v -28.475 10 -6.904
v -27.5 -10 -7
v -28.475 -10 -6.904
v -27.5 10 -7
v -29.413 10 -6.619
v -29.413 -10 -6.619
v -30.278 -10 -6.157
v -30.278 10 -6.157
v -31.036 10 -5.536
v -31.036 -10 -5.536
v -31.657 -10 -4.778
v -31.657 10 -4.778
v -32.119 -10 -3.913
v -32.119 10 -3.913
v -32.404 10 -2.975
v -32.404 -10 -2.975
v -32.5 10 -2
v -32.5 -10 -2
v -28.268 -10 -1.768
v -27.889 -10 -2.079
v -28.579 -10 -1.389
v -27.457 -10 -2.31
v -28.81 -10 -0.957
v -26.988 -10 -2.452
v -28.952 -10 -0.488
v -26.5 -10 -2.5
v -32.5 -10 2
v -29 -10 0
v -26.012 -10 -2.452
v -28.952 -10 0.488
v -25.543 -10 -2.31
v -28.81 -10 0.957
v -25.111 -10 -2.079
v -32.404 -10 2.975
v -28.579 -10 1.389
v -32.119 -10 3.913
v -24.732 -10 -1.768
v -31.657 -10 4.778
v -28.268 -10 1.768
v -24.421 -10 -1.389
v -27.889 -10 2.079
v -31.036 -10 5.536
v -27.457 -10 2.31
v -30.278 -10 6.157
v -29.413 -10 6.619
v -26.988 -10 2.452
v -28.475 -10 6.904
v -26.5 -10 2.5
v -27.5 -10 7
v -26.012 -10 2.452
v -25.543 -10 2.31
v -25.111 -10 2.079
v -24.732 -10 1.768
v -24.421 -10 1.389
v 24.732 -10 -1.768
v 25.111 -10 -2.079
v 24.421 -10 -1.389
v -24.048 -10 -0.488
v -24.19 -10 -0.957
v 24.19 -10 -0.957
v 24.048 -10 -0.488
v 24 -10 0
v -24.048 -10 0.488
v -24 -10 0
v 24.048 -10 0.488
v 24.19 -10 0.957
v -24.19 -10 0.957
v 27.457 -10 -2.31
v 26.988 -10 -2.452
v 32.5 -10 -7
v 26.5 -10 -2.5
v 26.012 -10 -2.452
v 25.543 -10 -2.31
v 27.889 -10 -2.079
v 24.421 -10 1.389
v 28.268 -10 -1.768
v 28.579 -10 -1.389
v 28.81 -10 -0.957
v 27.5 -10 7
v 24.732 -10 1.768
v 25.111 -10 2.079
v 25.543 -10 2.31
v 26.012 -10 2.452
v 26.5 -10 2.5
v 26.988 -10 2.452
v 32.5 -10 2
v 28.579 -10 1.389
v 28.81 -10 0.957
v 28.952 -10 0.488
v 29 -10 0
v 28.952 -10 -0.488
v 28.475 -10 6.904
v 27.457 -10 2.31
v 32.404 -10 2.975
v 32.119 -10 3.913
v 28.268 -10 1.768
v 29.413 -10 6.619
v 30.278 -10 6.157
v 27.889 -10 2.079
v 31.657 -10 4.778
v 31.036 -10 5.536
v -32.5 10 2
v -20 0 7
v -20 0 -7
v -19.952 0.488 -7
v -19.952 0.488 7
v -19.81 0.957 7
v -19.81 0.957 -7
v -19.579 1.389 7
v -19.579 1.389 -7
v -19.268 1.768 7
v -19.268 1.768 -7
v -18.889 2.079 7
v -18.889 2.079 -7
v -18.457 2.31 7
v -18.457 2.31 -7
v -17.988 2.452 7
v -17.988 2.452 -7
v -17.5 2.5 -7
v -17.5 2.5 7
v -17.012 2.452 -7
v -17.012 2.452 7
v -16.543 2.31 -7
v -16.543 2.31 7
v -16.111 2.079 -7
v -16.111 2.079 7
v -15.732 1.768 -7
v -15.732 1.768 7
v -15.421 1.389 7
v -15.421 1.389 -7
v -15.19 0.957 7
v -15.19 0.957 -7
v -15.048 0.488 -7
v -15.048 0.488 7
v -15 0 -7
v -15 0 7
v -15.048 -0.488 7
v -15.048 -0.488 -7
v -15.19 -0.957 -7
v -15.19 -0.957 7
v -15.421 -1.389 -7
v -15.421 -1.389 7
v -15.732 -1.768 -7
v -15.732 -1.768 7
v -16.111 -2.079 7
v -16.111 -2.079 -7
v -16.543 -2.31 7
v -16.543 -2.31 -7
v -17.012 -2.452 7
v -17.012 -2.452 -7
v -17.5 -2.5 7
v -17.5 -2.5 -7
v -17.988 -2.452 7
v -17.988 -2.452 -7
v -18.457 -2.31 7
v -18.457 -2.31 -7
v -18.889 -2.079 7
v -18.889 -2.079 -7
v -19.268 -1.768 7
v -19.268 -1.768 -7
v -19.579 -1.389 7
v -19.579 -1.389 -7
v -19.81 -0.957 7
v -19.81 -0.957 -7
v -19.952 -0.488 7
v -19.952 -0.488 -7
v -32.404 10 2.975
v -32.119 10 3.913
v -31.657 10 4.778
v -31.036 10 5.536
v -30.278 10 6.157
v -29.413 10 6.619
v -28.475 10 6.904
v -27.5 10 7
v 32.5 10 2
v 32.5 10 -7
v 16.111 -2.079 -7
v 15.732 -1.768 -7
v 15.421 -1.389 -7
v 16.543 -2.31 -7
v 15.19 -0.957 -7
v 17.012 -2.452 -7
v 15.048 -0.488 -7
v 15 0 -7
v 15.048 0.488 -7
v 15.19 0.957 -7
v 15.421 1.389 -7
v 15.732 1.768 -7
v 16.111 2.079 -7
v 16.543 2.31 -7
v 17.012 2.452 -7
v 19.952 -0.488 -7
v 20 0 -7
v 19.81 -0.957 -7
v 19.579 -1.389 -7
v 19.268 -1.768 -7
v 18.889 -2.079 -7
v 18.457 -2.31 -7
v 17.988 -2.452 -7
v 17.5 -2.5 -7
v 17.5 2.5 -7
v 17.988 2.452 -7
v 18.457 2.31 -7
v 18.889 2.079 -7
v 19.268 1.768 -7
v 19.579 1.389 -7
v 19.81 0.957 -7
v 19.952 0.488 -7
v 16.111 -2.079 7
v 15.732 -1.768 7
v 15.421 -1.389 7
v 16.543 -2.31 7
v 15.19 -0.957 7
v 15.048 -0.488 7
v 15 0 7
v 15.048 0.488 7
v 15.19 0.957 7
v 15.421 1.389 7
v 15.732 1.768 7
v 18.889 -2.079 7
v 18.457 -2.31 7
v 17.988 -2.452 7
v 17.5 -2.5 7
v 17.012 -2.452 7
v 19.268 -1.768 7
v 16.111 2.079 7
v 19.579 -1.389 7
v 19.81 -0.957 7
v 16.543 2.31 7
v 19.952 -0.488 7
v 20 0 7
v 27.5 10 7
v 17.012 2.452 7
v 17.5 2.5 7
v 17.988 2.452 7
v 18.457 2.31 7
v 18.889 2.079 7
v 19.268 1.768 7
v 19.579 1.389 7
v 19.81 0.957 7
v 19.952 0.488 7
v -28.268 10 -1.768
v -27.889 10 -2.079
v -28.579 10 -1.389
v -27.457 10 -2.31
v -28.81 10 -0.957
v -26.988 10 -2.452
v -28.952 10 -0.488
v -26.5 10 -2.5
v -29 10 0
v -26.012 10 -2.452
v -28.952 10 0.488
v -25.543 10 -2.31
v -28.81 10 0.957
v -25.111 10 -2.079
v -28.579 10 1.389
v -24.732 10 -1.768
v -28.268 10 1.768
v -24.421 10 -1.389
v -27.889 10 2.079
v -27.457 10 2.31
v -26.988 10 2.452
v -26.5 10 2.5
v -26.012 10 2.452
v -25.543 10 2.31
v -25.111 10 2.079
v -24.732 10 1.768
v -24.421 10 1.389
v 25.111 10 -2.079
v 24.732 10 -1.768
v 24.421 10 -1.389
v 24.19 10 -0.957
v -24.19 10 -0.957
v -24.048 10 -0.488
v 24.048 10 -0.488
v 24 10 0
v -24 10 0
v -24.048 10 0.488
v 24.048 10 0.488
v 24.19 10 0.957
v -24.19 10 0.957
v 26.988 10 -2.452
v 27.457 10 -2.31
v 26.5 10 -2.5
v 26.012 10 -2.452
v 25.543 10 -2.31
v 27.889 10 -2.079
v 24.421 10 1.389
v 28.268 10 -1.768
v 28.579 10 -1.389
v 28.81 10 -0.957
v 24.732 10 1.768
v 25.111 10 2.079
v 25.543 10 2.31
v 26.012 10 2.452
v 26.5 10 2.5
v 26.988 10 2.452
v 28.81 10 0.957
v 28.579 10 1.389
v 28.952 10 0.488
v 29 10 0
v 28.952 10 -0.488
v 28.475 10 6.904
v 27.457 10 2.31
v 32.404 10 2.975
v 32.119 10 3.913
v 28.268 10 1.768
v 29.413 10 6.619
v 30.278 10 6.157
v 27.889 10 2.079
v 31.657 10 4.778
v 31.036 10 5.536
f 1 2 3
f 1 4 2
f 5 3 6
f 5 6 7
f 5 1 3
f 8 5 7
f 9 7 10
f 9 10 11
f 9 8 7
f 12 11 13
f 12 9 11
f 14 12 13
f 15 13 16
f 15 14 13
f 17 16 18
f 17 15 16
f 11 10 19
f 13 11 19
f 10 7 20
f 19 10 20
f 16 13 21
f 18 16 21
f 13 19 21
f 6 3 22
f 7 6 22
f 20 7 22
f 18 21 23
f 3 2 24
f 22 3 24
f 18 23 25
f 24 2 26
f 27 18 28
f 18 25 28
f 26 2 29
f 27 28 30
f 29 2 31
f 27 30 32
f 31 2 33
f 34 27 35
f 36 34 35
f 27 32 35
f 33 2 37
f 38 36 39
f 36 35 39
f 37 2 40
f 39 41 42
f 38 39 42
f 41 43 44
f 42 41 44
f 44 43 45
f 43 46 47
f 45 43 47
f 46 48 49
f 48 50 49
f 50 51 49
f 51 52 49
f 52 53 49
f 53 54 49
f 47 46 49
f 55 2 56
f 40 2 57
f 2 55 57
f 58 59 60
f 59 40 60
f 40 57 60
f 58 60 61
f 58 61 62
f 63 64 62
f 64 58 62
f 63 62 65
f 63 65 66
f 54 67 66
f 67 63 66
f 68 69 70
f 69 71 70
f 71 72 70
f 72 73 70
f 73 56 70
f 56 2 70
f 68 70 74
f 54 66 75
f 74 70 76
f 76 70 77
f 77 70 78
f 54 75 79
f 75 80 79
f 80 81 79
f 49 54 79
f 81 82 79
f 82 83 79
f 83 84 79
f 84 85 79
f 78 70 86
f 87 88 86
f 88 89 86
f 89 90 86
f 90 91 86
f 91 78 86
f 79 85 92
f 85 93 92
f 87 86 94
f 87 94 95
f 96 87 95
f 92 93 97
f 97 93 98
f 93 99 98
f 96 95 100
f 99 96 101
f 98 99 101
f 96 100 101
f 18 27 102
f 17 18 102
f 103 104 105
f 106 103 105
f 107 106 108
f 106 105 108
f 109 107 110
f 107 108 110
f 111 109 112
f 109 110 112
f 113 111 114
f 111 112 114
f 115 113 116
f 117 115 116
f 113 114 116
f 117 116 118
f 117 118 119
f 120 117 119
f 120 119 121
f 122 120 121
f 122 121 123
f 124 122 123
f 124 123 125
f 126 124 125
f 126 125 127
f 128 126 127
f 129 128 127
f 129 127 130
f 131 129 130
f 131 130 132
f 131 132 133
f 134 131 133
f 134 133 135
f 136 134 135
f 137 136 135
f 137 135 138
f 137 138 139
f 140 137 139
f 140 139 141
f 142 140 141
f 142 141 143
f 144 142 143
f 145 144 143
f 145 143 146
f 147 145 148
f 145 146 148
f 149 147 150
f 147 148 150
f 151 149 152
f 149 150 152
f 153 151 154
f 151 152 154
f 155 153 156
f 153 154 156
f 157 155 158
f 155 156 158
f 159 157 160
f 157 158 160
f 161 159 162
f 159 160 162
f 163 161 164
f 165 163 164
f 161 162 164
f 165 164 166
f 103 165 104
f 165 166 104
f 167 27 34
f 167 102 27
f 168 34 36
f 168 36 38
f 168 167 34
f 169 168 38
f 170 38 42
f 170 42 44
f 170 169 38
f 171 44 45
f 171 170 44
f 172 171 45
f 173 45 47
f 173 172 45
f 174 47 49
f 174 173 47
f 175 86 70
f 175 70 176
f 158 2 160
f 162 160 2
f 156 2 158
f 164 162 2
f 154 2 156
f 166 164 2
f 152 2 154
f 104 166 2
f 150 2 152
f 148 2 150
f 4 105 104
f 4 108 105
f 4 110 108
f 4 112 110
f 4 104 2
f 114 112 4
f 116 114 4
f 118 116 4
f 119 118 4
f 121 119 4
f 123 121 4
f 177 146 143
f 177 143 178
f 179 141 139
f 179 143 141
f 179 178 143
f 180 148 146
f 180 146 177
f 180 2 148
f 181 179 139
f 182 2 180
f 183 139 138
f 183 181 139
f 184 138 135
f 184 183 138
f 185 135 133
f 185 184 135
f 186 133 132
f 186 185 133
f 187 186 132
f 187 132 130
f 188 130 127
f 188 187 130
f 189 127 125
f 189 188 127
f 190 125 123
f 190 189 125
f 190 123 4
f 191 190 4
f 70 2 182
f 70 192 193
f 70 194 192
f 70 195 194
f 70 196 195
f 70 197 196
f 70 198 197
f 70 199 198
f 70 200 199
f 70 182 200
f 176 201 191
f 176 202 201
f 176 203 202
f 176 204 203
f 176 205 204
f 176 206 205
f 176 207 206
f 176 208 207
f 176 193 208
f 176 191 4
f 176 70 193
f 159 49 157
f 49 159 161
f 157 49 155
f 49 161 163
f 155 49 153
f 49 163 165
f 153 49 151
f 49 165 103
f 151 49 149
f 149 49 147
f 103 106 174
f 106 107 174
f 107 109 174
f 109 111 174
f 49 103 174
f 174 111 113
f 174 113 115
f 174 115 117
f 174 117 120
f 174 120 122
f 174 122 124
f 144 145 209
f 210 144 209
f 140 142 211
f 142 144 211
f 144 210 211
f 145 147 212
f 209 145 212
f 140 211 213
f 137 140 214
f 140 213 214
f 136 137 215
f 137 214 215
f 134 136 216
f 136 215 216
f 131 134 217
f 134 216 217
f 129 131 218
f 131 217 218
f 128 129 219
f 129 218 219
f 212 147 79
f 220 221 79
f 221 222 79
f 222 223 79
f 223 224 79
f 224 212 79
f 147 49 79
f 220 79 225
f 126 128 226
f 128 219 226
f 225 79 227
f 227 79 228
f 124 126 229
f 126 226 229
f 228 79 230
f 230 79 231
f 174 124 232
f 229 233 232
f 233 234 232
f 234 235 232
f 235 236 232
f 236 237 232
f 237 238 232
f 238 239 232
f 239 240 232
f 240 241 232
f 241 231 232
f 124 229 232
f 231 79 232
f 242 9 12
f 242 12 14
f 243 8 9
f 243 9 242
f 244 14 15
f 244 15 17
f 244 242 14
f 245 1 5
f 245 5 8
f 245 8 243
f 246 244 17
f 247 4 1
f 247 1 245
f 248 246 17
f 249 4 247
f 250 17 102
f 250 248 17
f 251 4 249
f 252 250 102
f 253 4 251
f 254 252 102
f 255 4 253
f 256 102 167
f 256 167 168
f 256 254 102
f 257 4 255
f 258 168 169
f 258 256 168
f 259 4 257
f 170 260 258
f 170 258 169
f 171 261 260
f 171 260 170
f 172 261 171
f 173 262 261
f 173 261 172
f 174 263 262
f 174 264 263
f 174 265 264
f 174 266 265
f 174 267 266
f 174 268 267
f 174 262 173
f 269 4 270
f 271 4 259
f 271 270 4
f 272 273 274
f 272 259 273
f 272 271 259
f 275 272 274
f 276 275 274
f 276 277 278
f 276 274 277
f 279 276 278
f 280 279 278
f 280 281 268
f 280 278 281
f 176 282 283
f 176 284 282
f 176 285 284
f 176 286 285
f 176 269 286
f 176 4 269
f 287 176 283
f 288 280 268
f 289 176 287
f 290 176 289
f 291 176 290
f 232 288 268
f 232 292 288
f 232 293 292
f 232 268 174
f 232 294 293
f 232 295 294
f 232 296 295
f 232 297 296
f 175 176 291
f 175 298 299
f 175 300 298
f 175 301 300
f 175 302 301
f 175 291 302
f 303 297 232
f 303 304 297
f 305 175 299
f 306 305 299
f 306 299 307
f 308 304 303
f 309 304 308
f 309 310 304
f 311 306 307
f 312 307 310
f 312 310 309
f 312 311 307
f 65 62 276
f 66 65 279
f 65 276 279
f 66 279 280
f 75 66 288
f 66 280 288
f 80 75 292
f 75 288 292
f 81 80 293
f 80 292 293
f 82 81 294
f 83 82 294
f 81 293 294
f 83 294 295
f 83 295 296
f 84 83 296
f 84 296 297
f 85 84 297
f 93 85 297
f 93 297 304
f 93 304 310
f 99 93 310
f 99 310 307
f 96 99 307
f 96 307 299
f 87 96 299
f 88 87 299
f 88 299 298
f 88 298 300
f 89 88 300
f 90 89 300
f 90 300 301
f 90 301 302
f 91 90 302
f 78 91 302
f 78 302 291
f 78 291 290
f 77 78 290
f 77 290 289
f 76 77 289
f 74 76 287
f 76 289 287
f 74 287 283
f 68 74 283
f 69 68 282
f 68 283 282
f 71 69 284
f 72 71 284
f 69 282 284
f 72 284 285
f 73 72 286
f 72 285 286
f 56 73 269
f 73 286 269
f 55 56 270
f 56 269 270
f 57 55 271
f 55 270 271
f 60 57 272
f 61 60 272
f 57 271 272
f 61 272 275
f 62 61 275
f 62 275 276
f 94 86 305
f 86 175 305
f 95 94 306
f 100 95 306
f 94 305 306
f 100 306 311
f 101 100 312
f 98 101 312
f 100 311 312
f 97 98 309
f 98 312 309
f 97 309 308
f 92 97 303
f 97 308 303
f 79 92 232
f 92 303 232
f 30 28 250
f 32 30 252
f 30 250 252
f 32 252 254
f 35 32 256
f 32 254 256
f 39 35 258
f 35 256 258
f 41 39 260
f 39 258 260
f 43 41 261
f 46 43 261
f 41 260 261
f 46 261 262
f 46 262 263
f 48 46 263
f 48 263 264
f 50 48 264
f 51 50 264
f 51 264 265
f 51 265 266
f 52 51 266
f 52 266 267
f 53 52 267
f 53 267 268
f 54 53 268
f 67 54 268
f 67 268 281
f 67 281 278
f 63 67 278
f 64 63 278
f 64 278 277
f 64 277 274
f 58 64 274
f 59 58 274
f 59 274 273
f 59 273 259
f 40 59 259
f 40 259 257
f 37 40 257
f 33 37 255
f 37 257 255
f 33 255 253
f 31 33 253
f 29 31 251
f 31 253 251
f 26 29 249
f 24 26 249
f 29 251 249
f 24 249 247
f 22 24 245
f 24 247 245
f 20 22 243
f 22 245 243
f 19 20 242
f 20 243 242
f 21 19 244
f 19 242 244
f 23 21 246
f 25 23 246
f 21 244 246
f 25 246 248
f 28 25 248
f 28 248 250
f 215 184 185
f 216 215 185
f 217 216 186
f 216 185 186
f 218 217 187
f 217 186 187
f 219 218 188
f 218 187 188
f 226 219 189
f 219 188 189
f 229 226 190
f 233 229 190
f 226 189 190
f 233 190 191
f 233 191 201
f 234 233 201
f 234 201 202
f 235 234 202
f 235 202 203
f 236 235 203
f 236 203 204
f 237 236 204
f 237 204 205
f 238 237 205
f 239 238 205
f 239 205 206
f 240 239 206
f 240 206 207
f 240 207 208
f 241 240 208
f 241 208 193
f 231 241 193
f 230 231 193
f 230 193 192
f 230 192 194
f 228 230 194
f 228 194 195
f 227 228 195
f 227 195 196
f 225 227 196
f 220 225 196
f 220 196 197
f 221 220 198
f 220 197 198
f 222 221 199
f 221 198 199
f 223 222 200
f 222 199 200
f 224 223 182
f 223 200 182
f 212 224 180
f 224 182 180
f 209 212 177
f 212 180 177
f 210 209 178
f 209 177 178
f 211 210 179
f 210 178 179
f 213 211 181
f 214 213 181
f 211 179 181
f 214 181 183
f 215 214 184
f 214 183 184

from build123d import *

# Parameters (mm, degrees)
F0_W     = 20
F0_H     = 14
F1_DEPTH = 32.5
F3_D     = 5
F5_D     = 5
F6_R     = 5


with BuildPart() as f1:
    # F0 (on Right) → F1 (new body, symmetric)
    with BuildSketch(Plane.YZ):
        Rectangle(F0_W, F0_H)
    extrude(amount=F1_DEPTH, both=True)

    # F3 (through all)
    with Locations(Plane.XZ.offset(10)):
        with Locations((-26.5, 0), (26.5, 0)):
            Hole(F3_D / 2)

    # F5 (through all)
    with Locations(Plane.XY.offset(7)):
        with Locations((-17.5, 0), (17.5, 0)):
            Hole(F5_D / 2)

    # F6
    f6_edges = [f1.edges().sort_by_distance(p)[0] for p in [
        (32.5, 0, 7),
        (-32.5, 0, -7),
        (-32.5, 0, 7),
    ]]
    fillet(f6_edges, radius=F6_R)


solid = f1.part
